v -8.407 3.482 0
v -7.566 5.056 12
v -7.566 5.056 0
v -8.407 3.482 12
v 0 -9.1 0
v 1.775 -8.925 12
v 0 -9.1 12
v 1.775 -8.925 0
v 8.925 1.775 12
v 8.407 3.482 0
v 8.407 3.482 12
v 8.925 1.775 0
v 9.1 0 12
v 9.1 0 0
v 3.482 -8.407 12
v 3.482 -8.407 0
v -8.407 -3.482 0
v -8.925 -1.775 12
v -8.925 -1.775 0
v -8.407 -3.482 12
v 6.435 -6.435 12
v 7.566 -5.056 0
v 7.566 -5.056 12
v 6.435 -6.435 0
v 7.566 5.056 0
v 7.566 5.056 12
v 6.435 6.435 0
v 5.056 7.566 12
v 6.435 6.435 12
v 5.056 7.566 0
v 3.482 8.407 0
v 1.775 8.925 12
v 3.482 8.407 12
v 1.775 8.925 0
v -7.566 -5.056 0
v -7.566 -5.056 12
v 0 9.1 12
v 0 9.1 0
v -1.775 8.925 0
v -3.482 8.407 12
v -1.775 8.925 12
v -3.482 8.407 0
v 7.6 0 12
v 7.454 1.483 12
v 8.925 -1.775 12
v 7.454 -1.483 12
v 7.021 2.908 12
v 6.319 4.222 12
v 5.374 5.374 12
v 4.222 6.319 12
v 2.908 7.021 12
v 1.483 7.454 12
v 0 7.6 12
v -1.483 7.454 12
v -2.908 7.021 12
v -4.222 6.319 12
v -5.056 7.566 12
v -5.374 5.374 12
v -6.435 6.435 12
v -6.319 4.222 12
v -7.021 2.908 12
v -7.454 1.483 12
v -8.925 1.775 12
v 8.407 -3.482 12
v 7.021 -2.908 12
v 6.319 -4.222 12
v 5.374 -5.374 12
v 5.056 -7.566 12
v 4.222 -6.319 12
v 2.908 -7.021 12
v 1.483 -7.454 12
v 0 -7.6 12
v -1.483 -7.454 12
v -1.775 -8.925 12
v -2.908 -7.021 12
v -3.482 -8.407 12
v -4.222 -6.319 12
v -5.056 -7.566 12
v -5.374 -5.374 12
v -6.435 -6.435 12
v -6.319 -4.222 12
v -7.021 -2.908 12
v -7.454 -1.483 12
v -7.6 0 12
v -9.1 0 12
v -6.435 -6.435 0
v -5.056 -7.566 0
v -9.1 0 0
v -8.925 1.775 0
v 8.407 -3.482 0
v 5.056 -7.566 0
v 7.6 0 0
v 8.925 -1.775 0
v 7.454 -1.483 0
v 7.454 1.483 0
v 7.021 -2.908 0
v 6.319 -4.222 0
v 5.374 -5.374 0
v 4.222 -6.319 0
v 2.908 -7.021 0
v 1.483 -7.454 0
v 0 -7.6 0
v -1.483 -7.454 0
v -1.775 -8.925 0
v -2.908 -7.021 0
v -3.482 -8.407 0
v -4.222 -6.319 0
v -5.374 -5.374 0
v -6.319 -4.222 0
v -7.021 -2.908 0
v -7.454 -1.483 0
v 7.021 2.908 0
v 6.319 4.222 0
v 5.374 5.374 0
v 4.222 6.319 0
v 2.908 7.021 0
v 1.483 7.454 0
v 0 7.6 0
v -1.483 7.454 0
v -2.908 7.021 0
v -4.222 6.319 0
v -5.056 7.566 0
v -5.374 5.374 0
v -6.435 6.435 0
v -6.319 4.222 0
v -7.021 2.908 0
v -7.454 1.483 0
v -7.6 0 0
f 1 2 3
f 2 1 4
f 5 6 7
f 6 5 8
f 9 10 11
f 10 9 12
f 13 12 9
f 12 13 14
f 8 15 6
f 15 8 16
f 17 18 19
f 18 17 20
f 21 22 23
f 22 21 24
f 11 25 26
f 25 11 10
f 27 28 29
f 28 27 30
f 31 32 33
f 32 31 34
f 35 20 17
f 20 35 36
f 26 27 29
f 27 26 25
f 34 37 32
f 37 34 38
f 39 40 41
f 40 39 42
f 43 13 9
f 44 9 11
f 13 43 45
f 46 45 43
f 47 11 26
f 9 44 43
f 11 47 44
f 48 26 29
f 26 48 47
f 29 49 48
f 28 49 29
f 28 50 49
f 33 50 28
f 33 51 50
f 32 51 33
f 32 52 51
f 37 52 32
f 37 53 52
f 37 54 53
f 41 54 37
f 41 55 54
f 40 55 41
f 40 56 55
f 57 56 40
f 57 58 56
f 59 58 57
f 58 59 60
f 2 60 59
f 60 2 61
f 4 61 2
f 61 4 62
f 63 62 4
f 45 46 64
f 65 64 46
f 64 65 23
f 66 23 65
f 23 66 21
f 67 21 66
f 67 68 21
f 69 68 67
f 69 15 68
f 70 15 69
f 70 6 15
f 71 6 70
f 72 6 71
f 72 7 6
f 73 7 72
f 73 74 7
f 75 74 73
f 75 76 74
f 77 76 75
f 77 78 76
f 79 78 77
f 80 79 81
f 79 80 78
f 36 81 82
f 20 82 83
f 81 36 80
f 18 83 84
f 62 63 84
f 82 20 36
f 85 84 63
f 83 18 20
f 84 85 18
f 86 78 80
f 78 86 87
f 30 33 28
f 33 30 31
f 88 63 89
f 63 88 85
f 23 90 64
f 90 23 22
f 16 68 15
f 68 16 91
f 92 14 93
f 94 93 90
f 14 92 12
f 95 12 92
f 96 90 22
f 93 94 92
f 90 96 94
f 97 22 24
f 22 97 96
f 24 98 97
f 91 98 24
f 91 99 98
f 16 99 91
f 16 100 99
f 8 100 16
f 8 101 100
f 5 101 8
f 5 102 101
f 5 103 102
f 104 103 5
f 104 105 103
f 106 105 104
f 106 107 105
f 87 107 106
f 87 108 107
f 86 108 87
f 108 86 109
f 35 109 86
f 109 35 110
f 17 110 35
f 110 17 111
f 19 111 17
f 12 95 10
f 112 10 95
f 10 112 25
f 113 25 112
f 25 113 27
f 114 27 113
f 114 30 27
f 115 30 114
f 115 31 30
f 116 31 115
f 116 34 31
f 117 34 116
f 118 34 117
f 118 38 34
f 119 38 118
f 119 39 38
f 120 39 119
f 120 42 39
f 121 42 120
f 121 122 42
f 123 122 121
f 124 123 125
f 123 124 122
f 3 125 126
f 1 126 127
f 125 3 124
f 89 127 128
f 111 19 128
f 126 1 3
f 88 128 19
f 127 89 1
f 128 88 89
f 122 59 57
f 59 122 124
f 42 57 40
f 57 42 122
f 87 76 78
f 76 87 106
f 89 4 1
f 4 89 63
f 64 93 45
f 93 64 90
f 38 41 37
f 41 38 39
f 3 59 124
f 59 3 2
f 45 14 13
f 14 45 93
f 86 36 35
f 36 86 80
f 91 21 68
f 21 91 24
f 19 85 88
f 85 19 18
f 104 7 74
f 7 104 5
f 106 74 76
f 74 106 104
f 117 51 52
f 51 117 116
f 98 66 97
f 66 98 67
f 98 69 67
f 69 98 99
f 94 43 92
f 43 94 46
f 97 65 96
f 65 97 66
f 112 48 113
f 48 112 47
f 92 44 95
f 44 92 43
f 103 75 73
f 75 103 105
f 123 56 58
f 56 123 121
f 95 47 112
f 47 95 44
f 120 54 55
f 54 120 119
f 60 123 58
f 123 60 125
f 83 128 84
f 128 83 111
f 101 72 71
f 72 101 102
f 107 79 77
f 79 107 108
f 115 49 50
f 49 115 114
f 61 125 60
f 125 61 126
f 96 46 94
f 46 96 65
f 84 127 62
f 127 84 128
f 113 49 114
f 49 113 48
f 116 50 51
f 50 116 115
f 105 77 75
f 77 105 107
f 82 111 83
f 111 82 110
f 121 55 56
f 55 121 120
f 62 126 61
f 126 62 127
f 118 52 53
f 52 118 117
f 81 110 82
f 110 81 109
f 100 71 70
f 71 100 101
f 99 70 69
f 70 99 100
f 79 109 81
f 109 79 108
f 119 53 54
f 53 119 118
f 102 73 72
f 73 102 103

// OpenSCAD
$fn = 32;

// ----------------------------------------------------------------------
// Spacer sleeve: 18.2 / 15.2 x 12 mm
// ----------------------------------------------------------------------

// --- parameters (mm) ---
sleeve_od = 18.2;         // outside diameter
sleeve_id = 15.2;         // shaft bore
sleeve_l = 12;            // sleeve length

module sleeve() {
  cylinder(h = sleeve_l, d = sleeve_od);
}

difference() {
  sleeve();
  translate([0, 0, -1]) cylinder(h = sleeve_l + 2, d = sleeve_id);
}
